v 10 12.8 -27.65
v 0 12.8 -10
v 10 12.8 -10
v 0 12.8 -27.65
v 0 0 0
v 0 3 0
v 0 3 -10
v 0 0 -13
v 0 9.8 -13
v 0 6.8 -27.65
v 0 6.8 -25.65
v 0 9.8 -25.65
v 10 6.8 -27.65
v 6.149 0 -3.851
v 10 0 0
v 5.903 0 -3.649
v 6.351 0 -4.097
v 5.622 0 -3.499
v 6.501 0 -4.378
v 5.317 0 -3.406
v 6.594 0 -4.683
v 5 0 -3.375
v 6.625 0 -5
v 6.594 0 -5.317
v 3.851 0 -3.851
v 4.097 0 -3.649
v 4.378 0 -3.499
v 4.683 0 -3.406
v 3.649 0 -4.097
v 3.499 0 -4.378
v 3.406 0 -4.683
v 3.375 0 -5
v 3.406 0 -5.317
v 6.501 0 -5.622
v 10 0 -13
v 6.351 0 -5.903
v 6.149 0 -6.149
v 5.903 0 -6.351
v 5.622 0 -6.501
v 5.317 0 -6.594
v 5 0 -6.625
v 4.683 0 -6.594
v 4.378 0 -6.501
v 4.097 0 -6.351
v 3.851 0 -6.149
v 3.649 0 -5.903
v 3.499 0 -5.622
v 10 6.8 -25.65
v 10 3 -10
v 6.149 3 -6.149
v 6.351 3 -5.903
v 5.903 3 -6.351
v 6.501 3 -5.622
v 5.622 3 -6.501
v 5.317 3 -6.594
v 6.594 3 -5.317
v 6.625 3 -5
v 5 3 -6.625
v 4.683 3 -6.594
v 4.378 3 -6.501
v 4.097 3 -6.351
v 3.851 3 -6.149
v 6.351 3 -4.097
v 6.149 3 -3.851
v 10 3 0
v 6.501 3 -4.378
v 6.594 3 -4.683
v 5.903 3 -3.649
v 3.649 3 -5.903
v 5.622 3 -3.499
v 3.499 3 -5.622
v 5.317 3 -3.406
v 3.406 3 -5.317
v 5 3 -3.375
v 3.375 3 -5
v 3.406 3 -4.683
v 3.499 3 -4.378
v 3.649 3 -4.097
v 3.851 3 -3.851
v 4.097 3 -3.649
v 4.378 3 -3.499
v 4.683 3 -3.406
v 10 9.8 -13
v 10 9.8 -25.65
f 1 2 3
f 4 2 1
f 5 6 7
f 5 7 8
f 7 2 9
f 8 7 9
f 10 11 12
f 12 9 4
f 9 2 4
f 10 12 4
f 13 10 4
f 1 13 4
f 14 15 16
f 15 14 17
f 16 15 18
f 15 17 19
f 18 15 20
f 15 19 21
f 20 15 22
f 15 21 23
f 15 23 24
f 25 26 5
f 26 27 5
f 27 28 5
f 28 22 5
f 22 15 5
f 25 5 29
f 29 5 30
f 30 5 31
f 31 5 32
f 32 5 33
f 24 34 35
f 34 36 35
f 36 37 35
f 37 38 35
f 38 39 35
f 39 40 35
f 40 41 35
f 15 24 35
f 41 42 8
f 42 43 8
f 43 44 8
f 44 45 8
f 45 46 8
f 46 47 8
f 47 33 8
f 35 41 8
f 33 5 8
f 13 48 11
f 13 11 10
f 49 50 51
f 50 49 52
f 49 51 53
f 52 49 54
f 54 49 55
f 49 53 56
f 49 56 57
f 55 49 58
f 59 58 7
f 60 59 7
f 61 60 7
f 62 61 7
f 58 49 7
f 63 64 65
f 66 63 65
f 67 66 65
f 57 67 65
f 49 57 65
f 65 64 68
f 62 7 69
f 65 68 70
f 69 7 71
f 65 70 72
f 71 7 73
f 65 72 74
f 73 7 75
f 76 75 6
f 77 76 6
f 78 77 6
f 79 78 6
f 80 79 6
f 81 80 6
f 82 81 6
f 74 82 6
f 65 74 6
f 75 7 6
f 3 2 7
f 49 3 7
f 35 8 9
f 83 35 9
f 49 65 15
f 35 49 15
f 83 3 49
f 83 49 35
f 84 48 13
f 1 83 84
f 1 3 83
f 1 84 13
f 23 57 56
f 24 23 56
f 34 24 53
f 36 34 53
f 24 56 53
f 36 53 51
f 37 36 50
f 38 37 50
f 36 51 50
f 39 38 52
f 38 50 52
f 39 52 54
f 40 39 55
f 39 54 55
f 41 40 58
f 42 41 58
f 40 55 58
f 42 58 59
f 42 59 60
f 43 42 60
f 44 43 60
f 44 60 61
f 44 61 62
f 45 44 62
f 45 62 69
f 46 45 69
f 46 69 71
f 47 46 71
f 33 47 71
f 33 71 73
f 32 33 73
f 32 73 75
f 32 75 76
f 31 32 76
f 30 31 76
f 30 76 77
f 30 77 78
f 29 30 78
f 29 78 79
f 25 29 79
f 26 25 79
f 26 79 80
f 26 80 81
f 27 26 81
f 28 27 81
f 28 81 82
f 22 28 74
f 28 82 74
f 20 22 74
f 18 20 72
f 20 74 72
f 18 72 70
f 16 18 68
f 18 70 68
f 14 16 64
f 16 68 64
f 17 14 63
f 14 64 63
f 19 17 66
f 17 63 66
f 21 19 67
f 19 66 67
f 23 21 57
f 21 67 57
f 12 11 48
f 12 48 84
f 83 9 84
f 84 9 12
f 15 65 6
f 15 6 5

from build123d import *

# Parameters (mm, degrees)
SALIENTE_EXTRUIR1_DEPTH = 10
CROQUIS4_W              = 2
CROQUIS4_H              = 6
SALIENTE_EXTRUIR2_DEPTH = 10
CROQUIS5_R              = 1.625
CORTAR_EXTRUIR1_DEPTH   = 4


with BuildPart() as part:
    # Croquis2 → Saliente-Extruir1 (new body)
    with BuildSketch(Plane(origin=(0, 0, 0), x_dir=(0, 0, -1), z_dir=(1, 0, 0))):
        Polygon((0, 0), (13, 0), (13, 9.8), (25.65, 9.8), (25.65, 12.8), (10, 12.8), (10, 3), (0, 3), align=None)
    extrude(amount=SALIENTE_EXTRUIR1_DEPTH)

    # Croquis4 → Saliente-Extruir2 (add, through all)
    with BuildSketch(Plane(origin=(0, 0, 0), x_dir=(0, 0, -1), z_dir=(1, 0, 0))):
        with Locations((26.65, 9.8)):
            Rectangle(CROQUIS4_W, CROQUIS4_H)
    extrude(amount=SALIENTE_EXTRUIR2_DEPTH)

    # Croquis5 → Cortar-Extruir1 (cut, through all)
    with BuildSketch(Plane(origin=(0, 3, 0), x_dir=(1, 0, 0), z_dir=(0, 1, 0))):
        with Locations((5, 5)):
            Circle(CROQUIS5_R)
    extrude(amount=-CORTAR_EXTRUIR1_DEPTH, mode=Mode.SUBTRACT)


solid = part.part
